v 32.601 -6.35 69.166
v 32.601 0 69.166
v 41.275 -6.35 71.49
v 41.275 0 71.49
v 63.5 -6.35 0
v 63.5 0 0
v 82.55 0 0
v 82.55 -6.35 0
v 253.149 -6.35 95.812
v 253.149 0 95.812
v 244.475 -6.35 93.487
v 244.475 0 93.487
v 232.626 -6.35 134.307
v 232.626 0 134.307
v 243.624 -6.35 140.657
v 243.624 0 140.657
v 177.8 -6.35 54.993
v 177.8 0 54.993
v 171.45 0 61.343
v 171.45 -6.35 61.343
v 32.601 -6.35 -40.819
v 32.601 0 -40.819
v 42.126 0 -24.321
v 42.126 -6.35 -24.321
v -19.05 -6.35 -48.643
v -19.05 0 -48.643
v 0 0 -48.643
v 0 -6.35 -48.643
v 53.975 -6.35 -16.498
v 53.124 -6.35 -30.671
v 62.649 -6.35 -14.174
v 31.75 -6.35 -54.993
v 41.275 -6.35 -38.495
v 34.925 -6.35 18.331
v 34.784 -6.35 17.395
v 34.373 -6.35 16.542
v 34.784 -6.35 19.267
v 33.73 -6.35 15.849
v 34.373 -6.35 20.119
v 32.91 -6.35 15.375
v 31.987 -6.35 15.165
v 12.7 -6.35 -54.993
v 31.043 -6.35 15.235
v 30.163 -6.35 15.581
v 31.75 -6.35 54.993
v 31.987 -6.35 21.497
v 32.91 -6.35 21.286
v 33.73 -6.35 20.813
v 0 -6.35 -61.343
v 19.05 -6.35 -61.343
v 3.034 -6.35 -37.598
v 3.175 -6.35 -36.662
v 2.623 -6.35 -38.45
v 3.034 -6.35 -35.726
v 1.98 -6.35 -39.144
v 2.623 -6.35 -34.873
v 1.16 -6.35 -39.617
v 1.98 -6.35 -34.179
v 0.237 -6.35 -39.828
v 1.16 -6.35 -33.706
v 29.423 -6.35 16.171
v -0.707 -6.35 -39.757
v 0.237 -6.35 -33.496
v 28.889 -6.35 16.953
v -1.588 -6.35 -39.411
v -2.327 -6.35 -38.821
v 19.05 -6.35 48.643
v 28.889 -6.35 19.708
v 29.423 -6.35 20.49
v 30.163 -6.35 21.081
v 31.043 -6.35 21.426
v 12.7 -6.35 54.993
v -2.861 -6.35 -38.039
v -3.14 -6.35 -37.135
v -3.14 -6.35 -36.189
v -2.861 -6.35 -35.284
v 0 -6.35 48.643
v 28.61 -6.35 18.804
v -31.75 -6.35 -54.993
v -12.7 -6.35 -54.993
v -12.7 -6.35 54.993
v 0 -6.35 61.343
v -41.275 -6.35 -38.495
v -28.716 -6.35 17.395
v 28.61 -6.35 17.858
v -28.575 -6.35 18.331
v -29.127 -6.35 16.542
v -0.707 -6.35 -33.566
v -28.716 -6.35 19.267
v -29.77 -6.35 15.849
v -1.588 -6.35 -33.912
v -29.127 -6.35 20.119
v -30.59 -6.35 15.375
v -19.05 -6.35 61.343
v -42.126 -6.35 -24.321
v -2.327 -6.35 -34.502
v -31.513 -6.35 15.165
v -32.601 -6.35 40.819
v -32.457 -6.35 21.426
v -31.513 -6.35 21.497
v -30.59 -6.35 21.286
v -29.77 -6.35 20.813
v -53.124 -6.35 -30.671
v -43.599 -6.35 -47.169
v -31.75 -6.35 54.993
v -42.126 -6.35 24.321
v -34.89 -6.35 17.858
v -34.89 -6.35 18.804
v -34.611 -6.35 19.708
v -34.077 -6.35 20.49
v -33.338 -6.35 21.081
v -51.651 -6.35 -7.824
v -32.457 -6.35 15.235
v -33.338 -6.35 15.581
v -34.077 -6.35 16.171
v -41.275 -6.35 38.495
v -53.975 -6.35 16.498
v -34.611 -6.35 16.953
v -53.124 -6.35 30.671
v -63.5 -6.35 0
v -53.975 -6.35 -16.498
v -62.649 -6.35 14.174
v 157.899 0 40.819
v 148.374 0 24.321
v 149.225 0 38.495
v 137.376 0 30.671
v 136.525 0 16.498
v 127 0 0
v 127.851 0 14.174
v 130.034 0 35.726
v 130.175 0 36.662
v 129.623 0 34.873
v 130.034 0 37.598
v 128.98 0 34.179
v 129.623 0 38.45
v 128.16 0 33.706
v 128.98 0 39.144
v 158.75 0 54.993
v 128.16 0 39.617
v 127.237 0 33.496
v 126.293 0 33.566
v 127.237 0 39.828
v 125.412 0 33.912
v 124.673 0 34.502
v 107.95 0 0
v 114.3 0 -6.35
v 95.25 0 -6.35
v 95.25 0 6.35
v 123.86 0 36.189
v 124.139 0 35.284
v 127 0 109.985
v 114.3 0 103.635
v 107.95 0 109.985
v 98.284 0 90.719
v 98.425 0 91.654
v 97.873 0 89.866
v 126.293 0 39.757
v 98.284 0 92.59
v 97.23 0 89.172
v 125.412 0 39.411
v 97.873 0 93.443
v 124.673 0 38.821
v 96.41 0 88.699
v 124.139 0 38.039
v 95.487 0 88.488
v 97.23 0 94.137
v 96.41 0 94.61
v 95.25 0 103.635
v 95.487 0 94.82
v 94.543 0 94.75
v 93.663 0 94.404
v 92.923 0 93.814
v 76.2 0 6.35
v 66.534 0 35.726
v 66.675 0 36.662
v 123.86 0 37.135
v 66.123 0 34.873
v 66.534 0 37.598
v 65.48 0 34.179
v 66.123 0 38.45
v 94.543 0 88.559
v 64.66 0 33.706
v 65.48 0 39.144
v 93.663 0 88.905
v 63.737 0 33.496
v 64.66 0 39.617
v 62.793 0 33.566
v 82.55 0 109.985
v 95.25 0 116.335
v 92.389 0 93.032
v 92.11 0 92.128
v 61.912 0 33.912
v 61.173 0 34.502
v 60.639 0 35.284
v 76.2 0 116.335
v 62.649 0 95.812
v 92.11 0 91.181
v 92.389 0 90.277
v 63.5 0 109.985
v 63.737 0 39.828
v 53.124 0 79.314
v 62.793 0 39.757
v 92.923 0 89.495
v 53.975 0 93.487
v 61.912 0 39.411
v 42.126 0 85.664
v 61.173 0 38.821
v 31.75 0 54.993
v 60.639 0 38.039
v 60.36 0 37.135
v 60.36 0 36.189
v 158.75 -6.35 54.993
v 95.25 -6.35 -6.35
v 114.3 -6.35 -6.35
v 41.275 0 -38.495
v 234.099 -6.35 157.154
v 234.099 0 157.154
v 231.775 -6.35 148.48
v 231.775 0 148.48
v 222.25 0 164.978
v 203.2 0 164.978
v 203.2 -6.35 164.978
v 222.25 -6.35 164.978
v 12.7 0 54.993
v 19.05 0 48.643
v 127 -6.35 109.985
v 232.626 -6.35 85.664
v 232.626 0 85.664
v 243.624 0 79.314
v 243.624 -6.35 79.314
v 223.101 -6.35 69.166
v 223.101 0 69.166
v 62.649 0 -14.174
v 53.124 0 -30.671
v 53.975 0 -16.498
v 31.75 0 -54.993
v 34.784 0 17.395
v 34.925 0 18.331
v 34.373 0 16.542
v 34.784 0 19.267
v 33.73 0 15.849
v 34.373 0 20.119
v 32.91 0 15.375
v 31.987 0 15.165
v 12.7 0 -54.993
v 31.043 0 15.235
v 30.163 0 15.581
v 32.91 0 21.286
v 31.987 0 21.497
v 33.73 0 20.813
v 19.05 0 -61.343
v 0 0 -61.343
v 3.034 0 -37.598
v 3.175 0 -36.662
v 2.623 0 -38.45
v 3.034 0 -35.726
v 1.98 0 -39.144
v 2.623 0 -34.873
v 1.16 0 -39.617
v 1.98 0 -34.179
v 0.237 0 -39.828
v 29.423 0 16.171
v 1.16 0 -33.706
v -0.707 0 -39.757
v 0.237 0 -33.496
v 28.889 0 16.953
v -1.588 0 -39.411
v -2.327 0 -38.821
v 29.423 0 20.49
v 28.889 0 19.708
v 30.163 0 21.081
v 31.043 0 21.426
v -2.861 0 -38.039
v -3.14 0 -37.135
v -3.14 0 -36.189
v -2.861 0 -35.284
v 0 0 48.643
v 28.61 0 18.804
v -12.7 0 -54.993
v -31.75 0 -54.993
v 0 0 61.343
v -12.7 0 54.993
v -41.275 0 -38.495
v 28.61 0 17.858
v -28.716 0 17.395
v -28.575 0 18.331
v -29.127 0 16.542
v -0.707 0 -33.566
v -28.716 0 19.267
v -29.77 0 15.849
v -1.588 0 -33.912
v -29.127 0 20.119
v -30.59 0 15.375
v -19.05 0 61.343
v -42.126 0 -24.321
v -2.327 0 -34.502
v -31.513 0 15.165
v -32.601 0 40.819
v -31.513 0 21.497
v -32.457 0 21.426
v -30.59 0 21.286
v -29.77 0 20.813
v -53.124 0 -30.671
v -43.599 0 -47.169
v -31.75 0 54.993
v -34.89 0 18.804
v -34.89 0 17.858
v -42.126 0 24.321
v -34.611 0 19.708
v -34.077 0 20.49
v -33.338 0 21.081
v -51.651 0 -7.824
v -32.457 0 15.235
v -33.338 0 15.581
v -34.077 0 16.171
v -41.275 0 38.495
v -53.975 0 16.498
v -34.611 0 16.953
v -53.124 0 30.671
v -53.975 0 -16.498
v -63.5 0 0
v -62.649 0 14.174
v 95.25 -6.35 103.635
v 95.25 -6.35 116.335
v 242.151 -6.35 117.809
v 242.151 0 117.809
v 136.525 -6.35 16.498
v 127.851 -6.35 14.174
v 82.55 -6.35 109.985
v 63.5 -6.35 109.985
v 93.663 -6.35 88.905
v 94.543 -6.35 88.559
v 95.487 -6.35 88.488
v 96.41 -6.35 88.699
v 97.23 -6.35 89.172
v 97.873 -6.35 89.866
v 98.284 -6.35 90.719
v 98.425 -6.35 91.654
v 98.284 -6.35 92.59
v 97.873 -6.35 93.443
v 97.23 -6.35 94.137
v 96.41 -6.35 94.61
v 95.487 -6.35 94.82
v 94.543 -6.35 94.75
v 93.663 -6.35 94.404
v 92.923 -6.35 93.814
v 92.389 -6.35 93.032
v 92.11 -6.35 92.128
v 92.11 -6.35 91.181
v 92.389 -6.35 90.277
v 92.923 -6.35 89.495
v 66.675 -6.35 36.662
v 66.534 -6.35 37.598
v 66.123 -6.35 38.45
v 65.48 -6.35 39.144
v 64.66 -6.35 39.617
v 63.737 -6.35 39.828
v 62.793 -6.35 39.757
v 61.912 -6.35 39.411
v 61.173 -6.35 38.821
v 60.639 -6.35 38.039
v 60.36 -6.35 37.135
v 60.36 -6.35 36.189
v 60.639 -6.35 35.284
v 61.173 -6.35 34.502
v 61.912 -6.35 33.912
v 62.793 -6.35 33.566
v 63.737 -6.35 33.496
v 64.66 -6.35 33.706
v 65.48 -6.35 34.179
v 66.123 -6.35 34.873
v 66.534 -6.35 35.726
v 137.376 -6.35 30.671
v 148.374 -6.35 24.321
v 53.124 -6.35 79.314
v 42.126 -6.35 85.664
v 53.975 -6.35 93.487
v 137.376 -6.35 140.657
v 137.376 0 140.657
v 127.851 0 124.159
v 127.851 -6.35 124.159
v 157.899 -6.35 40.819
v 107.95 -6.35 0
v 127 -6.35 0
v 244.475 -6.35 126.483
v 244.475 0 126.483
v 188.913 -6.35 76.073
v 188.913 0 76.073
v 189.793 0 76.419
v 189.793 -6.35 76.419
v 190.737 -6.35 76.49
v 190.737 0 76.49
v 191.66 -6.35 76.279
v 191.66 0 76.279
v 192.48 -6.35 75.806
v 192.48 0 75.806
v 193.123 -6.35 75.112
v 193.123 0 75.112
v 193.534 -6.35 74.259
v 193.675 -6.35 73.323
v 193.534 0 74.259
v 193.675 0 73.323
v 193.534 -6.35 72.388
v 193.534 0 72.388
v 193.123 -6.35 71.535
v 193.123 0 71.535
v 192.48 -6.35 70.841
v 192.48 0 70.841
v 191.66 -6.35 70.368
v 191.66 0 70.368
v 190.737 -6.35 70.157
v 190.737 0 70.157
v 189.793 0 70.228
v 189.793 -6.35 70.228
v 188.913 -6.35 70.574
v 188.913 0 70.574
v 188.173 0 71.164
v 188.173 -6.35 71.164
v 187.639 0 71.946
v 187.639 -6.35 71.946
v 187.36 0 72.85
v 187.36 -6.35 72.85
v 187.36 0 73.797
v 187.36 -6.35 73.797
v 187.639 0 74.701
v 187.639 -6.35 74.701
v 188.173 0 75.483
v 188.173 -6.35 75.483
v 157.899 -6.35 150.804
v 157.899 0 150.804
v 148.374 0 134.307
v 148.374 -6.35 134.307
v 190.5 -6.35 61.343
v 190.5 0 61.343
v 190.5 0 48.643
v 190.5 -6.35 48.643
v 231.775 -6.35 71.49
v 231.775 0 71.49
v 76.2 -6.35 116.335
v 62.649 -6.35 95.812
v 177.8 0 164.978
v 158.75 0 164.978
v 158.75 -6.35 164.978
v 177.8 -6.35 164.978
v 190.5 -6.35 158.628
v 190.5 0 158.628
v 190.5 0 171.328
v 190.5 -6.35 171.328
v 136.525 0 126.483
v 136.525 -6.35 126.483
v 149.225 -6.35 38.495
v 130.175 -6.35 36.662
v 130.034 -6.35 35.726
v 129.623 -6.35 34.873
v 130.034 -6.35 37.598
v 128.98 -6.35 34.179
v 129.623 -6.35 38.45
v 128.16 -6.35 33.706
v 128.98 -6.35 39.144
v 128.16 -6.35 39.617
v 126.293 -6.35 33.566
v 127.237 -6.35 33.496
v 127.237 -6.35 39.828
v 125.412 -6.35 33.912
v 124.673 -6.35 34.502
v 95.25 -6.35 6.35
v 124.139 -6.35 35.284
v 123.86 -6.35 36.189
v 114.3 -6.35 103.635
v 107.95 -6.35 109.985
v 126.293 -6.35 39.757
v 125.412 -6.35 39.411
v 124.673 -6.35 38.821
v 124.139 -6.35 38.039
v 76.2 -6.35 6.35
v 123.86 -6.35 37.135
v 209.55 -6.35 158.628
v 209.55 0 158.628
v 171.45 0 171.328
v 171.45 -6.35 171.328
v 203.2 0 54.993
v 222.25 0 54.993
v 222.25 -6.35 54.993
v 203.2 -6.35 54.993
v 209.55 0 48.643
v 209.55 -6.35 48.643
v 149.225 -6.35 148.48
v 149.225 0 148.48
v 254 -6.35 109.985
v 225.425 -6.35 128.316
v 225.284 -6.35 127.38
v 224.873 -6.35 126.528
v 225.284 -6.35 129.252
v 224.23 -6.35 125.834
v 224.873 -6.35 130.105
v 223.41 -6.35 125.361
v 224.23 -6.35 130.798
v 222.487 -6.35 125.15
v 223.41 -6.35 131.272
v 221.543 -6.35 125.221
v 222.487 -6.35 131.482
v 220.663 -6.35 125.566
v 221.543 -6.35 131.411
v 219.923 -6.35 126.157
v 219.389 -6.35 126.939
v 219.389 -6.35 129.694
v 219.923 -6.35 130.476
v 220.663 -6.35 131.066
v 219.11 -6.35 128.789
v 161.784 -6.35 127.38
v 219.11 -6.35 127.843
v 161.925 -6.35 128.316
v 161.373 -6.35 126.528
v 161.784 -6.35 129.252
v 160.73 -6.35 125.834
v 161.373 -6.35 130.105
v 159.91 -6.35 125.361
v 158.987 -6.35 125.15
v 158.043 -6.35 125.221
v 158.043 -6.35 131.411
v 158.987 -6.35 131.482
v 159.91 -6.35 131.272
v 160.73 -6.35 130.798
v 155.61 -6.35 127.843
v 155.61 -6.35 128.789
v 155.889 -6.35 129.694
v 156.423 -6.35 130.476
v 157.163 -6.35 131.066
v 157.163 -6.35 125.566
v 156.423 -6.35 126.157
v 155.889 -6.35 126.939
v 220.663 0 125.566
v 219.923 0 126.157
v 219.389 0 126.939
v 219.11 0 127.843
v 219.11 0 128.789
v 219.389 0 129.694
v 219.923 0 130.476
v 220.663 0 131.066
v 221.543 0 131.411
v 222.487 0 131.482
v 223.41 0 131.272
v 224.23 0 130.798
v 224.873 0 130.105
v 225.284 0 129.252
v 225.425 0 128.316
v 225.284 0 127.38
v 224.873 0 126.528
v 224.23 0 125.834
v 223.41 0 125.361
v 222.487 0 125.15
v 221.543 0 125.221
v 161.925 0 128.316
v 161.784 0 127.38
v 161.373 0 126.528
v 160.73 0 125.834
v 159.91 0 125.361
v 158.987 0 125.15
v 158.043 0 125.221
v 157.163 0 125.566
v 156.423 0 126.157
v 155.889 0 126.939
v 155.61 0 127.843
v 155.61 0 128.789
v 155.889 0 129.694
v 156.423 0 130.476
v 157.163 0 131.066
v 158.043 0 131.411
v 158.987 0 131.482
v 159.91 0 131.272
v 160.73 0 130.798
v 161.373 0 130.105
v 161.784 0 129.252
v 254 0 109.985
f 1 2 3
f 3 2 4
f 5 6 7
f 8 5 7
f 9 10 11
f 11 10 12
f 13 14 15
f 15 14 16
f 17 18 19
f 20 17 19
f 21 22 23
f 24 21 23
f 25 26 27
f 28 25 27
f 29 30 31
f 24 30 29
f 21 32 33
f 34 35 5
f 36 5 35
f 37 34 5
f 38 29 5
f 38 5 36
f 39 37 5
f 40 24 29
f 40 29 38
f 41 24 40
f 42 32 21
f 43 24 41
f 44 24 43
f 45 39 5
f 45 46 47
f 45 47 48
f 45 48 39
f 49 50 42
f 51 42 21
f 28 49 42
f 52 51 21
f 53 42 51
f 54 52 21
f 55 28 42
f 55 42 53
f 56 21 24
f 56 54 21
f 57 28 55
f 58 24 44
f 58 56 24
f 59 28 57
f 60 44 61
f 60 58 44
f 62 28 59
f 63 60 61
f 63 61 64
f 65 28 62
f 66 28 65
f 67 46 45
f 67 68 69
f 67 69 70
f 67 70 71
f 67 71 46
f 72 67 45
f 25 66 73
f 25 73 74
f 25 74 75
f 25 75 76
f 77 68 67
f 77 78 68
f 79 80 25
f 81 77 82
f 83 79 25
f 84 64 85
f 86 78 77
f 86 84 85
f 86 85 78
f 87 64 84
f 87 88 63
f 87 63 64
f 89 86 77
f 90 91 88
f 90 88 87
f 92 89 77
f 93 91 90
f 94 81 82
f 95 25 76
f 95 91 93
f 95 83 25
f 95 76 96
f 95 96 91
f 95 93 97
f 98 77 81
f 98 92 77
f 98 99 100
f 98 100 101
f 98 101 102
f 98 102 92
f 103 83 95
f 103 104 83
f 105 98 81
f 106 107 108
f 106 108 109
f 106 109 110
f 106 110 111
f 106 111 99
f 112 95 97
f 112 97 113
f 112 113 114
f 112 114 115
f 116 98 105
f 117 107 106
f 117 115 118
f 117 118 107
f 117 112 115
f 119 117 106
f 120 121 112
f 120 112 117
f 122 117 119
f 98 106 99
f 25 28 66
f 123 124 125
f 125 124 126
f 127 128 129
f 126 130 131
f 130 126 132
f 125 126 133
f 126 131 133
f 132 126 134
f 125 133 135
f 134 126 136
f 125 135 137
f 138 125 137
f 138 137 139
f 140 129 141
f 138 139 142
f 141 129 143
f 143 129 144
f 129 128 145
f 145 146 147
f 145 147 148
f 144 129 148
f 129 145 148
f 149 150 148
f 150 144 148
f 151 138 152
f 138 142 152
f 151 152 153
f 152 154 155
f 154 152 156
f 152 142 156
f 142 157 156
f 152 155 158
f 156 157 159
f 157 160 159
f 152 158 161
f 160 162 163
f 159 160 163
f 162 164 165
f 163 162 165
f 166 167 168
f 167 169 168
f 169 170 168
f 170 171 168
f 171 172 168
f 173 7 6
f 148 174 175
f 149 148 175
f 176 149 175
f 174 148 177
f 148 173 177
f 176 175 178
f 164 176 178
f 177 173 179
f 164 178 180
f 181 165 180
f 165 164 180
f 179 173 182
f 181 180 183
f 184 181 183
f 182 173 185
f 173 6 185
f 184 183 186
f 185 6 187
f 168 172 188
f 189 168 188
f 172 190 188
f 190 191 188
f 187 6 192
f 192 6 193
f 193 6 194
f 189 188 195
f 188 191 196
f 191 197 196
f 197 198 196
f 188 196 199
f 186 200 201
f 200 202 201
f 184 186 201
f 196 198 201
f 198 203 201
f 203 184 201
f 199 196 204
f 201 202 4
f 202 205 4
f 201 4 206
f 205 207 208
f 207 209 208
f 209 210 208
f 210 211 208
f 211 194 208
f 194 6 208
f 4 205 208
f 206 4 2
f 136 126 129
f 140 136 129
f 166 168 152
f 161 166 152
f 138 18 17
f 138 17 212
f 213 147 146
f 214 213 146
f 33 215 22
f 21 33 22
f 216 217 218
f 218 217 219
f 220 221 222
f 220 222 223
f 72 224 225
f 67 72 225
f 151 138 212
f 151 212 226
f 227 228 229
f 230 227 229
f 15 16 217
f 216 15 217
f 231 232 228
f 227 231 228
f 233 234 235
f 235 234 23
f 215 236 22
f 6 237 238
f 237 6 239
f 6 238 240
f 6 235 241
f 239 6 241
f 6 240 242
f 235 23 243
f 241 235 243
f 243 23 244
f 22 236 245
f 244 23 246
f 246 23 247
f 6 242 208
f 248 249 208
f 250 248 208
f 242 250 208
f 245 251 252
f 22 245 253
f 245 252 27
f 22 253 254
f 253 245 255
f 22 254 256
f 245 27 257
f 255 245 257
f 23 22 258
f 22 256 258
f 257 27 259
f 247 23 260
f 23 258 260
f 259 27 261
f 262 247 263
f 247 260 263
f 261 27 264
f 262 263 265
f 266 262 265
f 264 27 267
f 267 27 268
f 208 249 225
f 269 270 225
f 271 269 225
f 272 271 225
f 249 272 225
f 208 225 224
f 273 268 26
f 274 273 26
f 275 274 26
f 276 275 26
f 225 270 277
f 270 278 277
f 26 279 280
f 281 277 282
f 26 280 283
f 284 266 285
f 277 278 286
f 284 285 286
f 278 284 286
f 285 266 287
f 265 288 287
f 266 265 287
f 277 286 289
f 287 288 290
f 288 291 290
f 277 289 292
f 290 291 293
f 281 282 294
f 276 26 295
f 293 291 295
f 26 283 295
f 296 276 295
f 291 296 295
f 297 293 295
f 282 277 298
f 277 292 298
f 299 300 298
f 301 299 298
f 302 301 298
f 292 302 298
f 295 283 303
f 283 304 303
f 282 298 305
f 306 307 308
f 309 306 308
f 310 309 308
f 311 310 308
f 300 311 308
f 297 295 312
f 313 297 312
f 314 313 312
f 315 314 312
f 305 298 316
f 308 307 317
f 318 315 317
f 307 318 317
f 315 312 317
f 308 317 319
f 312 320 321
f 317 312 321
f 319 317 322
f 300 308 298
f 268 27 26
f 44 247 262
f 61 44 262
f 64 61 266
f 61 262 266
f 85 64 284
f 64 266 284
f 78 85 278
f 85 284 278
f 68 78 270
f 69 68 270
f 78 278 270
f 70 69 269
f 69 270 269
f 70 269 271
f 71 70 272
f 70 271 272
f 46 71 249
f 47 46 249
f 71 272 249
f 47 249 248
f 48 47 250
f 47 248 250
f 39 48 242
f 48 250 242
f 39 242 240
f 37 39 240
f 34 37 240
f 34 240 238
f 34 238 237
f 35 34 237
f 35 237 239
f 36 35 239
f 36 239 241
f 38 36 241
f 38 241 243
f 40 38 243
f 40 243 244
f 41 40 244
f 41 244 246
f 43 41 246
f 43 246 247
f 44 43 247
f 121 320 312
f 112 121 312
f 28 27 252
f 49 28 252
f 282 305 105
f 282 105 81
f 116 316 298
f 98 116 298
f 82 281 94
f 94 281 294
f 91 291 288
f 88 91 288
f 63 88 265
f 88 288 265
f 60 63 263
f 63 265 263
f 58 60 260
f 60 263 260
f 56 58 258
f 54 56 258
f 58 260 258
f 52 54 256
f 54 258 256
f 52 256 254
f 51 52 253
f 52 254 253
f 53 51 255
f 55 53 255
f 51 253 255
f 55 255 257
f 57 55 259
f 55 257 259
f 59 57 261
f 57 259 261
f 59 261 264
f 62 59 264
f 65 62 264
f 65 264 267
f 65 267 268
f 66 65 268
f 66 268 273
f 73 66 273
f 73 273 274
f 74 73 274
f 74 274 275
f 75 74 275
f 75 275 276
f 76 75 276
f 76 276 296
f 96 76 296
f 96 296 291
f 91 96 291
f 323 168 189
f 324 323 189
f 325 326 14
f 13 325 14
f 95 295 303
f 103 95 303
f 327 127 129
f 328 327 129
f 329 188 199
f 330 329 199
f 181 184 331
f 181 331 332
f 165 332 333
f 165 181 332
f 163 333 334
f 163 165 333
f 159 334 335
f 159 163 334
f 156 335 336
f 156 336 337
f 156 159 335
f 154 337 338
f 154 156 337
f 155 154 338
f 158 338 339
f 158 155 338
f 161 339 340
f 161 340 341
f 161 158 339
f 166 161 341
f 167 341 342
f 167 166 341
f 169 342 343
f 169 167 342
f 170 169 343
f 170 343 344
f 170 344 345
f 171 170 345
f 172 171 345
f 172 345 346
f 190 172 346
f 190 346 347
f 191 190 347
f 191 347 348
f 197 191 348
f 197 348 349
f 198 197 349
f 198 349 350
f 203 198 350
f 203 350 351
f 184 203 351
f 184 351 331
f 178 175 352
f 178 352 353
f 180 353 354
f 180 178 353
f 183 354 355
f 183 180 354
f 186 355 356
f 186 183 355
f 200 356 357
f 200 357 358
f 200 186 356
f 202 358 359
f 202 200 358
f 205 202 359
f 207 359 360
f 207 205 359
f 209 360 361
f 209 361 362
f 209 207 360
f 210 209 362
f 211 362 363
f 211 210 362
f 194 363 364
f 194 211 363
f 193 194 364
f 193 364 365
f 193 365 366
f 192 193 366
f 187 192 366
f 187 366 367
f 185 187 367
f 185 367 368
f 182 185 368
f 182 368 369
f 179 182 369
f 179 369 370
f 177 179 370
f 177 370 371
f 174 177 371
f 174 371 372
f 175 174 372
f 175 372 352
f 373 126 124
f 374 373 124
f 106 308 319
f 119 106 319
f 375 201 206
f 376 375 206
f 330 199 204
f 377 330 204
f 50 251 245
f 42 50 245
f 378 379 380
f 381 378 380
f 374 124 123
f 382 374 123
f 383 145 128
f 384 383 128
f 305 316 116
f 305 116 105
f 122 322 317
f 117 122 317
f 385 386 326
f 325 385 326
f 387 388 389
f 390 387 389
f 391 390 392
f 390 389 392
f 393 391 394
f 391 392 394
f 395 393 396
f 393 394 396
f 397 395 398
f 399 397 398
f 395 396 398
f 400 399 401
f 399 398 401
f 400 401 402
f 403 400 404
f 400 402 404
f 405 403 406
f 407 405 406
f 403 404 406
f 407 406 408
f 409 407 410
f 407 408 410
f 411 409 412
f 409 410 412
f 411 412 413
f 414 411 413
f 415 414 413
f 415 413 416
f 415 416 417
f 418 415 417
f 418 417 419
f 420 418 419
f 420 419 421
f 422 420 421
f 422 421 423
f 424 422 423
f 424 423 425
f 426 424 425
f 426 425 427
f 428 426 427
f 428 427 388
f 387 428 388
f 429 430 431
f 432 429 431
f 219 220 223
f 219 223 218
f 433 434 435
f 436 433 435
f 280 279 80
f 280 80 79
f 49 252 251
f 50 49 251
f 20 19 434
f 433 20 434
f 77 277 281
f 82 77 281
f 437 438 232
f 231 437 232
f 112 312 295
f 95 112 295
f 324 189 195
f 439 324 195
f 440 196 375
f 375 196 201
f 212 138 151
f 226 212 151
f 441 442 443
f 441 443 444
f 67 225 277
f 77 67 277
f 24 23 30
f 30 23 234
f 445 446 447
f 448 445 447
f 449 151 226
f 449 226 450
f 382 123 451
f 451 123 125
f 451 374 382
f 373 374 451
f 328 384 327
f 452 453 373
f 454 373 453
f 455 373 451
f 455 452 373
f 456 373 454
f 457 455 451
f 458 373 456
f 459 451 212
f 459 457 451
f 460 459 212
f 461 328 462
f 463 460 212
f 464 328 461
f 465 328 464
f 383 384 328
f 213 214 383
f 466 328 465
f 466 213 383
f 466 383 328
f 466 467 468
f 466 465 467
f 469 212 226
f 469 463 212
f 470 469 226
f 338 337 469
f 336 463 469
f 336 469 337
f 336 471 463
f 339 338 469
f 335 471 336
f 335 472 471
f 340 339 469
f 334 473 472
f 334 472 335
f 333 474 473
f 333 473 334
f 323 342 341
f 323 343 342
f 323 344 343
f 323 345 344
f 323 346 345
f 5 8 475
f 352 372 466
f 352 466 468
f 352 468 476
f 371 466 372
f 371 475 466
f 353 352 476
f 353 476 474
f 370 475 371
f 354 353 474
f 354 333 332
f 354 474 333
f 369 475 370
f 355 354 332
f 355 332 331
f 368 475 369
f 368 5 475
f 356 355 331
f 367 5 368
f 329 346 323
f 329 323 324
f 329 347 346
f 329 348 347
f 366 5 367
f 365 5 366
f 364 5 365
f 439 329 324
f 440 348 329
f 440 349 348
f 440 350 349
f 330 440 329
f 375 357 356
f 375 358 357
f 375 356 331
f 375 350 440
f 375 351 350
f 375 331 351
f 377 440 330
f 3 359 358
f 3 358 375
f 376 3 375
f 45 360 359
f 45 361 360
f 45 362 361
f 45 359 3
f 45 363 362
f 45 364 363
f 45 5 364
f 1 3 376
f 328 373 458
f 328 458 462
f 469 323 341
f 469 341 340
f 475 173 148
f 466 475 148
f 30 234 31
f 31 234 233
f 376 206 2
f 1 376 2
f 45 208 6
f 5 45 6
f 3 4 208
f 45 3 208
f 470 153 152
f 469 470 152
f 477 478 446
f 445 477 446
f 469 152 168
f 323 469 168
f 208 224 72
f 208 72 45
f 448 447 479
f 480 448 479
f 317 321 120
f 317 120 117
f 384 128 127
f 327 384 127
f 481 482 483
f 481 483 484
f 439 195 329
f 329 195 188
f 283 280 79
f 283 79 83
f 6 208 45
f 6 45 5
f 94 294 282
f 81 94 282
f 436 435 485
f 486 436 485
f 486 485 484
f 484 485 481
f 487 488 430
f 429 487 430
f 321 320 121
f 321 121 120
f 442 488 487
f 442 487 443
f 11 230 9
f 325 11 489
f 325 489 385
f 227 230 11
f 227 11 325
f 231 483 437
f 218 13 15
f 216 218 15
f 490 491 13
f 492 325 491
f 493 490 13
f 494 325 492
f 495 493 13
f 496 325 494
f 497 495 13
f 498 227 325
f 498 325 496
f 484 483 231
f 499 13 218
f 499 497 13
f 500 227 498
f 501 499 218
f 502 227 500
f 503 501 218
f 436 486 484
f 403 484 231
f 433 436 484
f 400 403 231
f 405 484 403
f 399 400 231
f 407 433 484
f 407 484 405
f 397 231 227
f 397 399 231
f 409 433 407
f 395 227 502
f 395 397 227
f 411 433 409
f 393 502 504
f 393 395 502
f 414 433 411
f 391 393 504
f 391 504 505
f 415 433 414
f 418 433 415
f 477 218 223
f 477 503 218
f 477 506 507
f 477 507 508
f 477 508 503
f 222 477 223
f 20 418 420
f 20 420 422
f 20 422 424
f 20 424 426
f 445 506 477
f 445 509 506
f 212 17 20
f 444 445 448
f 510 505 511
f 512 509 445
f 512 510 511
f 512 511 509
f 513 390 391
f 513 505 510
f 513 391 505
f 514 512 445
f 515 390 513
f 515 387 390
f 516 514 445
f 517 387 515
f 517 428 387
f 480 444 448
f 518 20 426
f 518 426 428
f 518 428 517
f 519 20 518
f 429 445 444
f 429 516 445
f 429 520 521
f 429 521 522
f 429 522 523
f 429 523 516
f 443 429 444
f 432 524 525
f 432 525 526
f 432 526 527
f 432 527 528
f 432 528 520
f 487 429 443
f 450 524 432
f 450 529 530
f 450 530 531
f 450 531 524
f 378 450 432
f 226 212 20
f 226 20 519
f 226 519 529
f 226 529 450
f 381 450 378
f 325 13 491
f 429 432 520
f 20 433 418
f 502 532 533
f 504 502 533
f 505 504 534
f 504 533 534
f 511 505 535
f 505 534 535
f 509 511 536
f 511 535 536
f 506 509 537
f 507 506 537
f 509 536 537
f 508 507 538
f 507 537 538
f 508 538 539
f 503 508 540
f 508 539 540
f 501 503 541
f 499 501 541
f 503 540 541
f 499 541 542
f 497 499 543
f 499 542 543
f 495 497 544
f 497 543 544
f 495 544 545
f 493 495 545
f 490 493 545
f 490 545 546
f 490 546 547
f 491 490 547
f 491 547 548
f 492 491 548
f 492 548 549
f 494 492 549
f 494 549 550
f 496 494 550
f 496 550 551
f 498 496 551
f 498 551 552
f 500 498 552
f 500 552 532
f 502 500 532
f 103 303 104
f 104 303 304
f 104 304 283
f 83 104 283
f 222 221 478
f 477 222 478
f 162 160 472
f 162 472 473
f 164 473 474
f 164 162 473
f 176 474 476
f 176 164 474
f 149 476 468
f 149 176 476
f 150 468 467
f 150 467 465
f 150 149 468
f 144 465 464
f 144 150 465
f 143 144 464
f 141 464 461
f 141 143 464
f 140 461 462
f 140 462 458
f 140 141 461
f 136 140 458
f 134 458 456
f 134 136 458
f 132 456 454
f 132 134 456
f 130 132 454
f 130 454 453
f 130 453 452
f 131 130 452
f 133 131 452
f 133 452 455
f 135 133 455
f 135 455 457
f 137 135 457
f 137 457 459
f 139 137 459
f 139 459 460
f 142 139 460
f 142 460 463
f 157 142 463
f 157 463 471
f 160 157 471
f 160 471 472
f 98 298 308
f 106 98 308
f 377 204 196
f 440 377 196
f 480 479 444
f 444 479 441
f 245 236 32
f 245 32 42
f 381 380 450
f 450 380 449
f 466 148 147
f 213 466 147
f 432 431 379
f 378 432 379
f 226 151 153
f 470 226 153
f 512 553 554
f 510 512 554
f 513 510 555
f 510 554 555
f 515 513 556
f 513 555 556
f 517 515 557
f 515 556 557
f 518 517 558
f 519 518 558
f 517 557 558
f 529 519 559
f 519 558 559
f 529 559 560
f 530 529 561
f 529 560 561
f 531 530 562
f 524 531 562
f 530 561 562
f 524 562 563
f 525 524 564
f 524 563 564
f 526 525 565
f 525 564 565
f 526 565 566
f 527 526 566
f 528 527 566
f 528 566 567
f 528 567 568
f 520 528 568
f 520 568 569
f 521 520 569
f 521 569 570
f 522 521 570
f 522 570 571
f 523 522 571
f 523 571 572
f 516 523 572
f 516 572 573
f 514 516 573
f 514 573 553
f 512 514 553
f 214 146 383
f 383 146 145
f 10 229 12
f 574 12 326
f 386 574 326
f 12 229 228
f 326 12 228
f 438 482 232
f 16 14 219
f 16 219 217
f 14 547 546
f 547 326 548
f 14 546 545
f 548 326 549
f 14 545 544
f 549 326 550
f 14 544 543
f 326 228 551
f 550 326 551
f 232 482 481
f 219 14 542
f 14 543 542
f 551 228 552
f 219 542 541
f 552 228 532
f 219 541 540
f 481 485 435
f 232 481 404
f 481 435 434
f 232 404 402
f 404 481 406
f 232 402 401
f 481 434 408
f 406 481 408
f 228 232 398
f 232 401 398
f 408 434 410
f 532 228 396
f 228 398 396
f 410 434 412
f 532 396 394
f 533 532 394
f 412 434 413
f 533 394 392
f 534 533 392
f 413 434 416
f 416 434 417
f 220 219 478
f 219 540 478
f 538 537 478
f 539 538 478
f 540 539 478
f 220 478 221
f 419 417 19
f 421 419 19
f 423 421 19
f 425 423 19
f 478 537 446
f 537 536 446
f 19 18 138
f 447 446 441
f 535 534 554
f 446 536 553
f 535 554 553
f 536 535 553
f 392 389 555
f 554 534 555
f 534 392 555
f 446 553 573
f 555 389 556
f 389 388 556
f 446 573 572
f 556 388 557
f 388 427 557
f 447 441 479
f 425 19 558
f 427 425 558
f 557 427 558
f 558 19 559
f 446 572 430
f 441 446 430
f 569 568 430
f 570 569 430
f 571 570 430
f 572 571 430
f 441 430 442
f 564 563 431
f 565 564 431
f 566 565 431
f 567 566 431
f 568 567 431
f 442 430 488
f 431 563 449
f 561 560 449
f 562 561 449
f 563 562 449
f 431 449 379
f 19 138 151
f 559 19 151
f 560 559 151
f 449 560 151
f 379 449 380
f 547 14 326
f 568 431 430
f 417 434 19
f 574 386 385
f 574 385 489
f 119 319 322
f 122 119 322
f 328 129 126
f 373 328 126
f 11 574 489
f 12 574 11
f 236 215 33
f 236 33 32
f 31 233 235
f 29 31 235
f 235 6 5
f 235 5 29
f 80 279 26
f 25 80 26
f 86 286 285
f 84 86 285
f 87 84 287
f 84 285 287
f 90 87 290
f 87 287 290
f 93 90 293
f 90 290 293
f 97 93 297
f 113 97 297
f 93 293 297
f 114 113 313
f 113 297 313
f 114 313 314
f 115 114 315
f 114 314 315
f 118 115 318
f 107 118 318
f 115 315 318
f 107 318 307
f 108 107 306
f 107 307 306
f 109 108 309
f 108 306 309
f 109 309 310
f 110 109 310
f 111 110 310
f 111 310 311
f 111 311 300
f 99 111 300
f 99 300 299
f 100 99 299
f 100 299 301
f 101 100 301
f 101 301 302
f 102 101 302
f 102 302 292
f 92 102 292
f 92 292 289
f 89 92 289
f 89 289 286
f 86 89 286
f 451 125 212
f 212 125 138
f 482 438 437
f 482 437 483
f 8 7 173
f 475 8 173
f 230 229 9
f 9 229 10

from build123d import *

# Parameters (mm, degrees)
BOSS_EXTRUDE1_DEPTH = 6.35
SKETCH9_R           = 3.175
CUT_EXTRUDE3_DEPTH  = 7.35
CIRPATTERN6_COUNT   = 3
CUT_EXTRUDE4_DEPTH  = 7.35
BOSS_EXTRUDE4_DEPTH = 6.35
CIRPATTERN7_COUNT   = 6
CUT_EXTRUDE5_DEPTH  = 7.35
BOSS_EXTRUDE5_DEPTH = 6.35
CIRPATTERN8_COUNT   = 6
CUT_EXTRUDE6_DEPTH  = 7.35
BOSS_EXTRUDE6_DEPTH = 6.35
CIRPATTERN9_COUNT   = 6


with BuildPart() as part:
    # Sketch1 → Boss-Extrude1 (new body)
    with BuildSketch(Plane(origin=(0, 0, 0), x_dir=(1, 0, 0), z_dir=(0, 1, 0))):
        Polygon((63.5, 0), (31.75, 54.99261314), (-31.75, 54.99261314), (-63.5, 0), (-31.75, -54.99261314), (31.75, -54.99261314), align=None)
    extrude(amount=-BOSS_EXTRUDE1_DEPTH)

    # Sketch9 → Cut-Extrude3 (cut, through all)
    with BuildSketch(Plane(origin=(0, 0, 0), x_dir=(1, 0, 0), z_dir=(0, 1, 0))):
        with Locations((-31.75, -18.330871047)):
            Circle(SKETCH9_R)
    cut_extrude3 = extrude(amount=-CUT_EXTRUDE3_DEPTH, mode=Mode.SUBTRACT)

    # CirPattern6: Cut-Extrude3 ×3 about axis
    cirpattern6_axis = Axis((0, 0, 0), (0, 1, 0))
    for i in range(1, CIRPATTERN6_COUNT):
        add(cut_extrude3.rotate(cirpattern6_axis, i * 360 / CIRPATTERN6_COUNT), mode=Mode.SUBTRACT)


with BuildPart() as body_2:
    # Mirror3: mirrored copy
    add(part.part.mirror(Plane(origin=(31.75, -6.35, 54.99261314), x_dir=(-0.5, 0, 0.866025404), z_dir=(0.866025404, 0, 0.5))))


with BuildPart() as part_1:
    add(part.part)

    # Sketch10 → Cut-Extrude4 (cut, through all)
    with BuildSketch(Plane(origin=(0, 0, 0), x_dir=(1, 0, 0), z_dir=(0, 1, 0))):
        Polygon((41.275, 38.494829198), (32.600738686, 40.819090512), (42.125738686, 24.32130657), (47.625, 27.49630657), align=None)
    cut_extrude4 = extrude(amount=-CUT_EXTRUDE4_DEPTH, mode=Mode.SUBTRACT)

    # Sketch11 → Boss-Extrude4 (add)
    with BuildSketch(Plane(origin=(0, 0, 0), x_dir=(1, 0, 0), z_dir=(0, 1, 0))):
        Polygon((47.625, 27.49630657), (53.124261314, 30.67130657), (62.649261314, 14.173522628), (53.975, 16.497783942), align=None)
    boss_extrude4 = extrude(amount=-BOSS_EXTRUDE4_DEPTH)

    # CirPattern7: Cut-Extrude4, Boss-Extrude4 ×6 about axis, 1 skipped
    cirpattern7_axis = Axis((0, 0, 0), (0, 1, 0))
    add([cut_extrude4.rotate(cirpattern7_axis, i * 360 / CIRPATTERN7_COUNT) for i in range(1, CIRPATTERN7_COUNT) if i not in (5,)], mode=Mode.SUBTRACT)
    add([boss_extrude4.rotate(cirpattern7_axis, i * 360 / CIRPATTERN7_COUNT) for i in range(1, CIRPATTERN7_COUNT) if i not in (5,)])


with BuildPart() as body_3:
    # Mirror4: mirrored copy
    add(body_2.part.mirror(Plane(origin=(158.75, -6.35, 54.99261314), x_dir=(-0.5, 0, 0.866025404), z_dir=(0.866025404, 0, 0.5))))

    # Sketch16 → Cut-Extrude6 (cut, through all)
    with BuildSketch(Plane(origin=(0, 0, 0), x_dir=(1, 0, 0), z_dir=(0, 1, 0))):
        Polygon((231.775, -71.490397082), (223.100738686, -69.166135768), (232.625738686, -85.66391971), (238.125, -82.48891971), align=None)
    cut_extrude6 = extrude(amount=-CUT_EXTRUDE6_DEPTH, mode=Mode.SUBTRACT)

    # Sketch17 → Boss-Extrude6 (add)
    with BuildSketch(Plane(origin=(0, 0, 0), x_dir=(1, 0, 0), z_dir=(0, 1, 0))):
        Polygon((238.125, -82.48891971), (243.624261314, -79.31391971), (253.149261314, -95.811703653), (244.475, -93.487442339), align=None)
    boss_extrude6 = extrude(amount=-BOSS_EXTRUDE6_DEPTH)

    # CirPattern9: Cut-Extrude6, Boss-Extrude6 ×6 about axis, 1 skipped
    cirpattern9_axis = Axis((190.5, 0, 109.985226281), (0, 1, 0))
    add([cut_extrude6.rotate(cirpattern9_axis, i * 360 / CIRPATTERN9_COUNT) for i in range(1, CIRPATTERN9_COUNT) if i not in (2,)], mode=Mode.SUBTRACT)
    add([boss_extrude6.rotate(cirpattern9_axis, i * 360 / CIRPATTERN9_COUNT) for i in range(1, CIRPATTERN9_COUNT) if i not in (2,)])


with BuildPart() as body_2_1:
    add(body_2.part)

    # Sketch13 → Cut-Extrude5 (cut, through all)
    with BuildSketch(Plane(origin=(0, 0, 0), x_dir=(1, 0, 0), z_dir=(0, 1, 0))):
        Polygon((136.525, -16.497783942), (127.850738686, -14.173522628), (137.375738686, -30.67130657), (142.875, -27.49630657), align=None)
    cut_extrude5 = extrude(amount=-CUT_EXTRUDE5_DEPTH, mode=Mode.SUBTRACT)

    # Sketch14 → Boss-Extrude5 (add)
    with BuildSketch(Plane(origin=(0, 0, 0), x_dir=(1, 0, 0), z_dir=(0, 1, 0))):
        Polygon((142.875, -27.49630657), (148.374261314, -24.32130657), (157.899261314, -40.819090512), (149.225, -38.494829198), align=None)
    boss_extrude5 = extrude(amount=-BOSS_EXTRUDE5_DEPTH)

    # CirPattern8: Cut-Extrude5, Boss-Extrude5 ×6 about axis, 2 skipped
    cirpattern8_axis = Axis((95.25, 0, 54.99261314), (0, 1, 0))
    add([cut_extrude5.rotate(cirpattern8_axis, i * 360 / CIRPATTERN8_COUNT) for i in range(1, CIRPATTERN8_COUNT) if i not in (2, 5)], mode=Mode.SUBTRACT)
    add([boss_extrude5.rotate(cirpattern8_axis, i * 360 / CIRPATTERN8_COUNT) for i in range(1, CIRPATTERN8_COUNT) if i not in (2, 5)])


solid = Compound([part_1.part, body_3.part, body_2_1.part])
